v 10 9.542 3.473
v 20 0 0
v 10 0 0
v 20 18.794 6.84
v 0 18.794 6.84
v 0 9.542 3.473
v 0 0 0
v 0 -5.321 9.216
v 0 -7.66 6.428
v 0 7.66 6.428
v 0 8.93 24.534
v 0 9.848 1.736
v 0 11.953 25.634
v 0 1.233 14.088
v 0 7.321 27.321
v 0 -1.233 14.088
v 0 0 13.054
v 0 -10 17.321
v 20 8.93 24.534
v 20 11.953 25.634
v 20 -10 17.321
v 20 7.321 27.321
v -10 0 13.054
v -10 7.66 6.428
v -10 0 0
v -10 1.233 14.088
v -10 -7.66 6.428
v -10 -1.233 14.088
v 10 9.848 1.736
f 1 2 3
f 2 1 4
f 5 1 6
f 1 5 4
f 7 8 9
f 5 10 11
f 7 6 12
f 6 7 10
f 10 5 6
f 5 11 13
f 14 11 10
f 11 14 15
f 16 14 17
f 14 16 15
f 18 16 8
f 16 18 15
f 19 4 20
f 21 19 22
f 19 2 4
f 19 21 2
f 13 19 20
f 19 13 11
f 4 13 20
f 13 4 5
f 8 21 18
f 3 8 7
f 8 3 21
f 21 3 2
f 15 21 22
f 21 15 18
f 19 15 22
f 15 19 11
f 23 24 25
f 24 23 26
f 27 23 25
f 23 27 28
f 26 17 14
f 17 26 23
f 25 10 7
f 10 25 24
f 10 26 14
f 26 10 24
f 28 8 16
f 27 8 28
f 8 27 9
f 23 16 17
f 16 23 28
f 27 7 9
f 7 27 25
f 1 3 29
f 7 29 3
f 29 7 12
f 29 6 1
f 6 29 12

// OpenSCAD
rotate([10,0,0]) cube(10);

rotate([20,0,0]) { cube(10); cube(20); }

rotate([30,0,0]) { color("red") cube(10); color("blue") cube(20); }

translate([-10,0,0]) union() {
    rotate([40,0,0]) color("black") cube(10);
    rotate([50,0,0]) color("green") cube(10);
};
